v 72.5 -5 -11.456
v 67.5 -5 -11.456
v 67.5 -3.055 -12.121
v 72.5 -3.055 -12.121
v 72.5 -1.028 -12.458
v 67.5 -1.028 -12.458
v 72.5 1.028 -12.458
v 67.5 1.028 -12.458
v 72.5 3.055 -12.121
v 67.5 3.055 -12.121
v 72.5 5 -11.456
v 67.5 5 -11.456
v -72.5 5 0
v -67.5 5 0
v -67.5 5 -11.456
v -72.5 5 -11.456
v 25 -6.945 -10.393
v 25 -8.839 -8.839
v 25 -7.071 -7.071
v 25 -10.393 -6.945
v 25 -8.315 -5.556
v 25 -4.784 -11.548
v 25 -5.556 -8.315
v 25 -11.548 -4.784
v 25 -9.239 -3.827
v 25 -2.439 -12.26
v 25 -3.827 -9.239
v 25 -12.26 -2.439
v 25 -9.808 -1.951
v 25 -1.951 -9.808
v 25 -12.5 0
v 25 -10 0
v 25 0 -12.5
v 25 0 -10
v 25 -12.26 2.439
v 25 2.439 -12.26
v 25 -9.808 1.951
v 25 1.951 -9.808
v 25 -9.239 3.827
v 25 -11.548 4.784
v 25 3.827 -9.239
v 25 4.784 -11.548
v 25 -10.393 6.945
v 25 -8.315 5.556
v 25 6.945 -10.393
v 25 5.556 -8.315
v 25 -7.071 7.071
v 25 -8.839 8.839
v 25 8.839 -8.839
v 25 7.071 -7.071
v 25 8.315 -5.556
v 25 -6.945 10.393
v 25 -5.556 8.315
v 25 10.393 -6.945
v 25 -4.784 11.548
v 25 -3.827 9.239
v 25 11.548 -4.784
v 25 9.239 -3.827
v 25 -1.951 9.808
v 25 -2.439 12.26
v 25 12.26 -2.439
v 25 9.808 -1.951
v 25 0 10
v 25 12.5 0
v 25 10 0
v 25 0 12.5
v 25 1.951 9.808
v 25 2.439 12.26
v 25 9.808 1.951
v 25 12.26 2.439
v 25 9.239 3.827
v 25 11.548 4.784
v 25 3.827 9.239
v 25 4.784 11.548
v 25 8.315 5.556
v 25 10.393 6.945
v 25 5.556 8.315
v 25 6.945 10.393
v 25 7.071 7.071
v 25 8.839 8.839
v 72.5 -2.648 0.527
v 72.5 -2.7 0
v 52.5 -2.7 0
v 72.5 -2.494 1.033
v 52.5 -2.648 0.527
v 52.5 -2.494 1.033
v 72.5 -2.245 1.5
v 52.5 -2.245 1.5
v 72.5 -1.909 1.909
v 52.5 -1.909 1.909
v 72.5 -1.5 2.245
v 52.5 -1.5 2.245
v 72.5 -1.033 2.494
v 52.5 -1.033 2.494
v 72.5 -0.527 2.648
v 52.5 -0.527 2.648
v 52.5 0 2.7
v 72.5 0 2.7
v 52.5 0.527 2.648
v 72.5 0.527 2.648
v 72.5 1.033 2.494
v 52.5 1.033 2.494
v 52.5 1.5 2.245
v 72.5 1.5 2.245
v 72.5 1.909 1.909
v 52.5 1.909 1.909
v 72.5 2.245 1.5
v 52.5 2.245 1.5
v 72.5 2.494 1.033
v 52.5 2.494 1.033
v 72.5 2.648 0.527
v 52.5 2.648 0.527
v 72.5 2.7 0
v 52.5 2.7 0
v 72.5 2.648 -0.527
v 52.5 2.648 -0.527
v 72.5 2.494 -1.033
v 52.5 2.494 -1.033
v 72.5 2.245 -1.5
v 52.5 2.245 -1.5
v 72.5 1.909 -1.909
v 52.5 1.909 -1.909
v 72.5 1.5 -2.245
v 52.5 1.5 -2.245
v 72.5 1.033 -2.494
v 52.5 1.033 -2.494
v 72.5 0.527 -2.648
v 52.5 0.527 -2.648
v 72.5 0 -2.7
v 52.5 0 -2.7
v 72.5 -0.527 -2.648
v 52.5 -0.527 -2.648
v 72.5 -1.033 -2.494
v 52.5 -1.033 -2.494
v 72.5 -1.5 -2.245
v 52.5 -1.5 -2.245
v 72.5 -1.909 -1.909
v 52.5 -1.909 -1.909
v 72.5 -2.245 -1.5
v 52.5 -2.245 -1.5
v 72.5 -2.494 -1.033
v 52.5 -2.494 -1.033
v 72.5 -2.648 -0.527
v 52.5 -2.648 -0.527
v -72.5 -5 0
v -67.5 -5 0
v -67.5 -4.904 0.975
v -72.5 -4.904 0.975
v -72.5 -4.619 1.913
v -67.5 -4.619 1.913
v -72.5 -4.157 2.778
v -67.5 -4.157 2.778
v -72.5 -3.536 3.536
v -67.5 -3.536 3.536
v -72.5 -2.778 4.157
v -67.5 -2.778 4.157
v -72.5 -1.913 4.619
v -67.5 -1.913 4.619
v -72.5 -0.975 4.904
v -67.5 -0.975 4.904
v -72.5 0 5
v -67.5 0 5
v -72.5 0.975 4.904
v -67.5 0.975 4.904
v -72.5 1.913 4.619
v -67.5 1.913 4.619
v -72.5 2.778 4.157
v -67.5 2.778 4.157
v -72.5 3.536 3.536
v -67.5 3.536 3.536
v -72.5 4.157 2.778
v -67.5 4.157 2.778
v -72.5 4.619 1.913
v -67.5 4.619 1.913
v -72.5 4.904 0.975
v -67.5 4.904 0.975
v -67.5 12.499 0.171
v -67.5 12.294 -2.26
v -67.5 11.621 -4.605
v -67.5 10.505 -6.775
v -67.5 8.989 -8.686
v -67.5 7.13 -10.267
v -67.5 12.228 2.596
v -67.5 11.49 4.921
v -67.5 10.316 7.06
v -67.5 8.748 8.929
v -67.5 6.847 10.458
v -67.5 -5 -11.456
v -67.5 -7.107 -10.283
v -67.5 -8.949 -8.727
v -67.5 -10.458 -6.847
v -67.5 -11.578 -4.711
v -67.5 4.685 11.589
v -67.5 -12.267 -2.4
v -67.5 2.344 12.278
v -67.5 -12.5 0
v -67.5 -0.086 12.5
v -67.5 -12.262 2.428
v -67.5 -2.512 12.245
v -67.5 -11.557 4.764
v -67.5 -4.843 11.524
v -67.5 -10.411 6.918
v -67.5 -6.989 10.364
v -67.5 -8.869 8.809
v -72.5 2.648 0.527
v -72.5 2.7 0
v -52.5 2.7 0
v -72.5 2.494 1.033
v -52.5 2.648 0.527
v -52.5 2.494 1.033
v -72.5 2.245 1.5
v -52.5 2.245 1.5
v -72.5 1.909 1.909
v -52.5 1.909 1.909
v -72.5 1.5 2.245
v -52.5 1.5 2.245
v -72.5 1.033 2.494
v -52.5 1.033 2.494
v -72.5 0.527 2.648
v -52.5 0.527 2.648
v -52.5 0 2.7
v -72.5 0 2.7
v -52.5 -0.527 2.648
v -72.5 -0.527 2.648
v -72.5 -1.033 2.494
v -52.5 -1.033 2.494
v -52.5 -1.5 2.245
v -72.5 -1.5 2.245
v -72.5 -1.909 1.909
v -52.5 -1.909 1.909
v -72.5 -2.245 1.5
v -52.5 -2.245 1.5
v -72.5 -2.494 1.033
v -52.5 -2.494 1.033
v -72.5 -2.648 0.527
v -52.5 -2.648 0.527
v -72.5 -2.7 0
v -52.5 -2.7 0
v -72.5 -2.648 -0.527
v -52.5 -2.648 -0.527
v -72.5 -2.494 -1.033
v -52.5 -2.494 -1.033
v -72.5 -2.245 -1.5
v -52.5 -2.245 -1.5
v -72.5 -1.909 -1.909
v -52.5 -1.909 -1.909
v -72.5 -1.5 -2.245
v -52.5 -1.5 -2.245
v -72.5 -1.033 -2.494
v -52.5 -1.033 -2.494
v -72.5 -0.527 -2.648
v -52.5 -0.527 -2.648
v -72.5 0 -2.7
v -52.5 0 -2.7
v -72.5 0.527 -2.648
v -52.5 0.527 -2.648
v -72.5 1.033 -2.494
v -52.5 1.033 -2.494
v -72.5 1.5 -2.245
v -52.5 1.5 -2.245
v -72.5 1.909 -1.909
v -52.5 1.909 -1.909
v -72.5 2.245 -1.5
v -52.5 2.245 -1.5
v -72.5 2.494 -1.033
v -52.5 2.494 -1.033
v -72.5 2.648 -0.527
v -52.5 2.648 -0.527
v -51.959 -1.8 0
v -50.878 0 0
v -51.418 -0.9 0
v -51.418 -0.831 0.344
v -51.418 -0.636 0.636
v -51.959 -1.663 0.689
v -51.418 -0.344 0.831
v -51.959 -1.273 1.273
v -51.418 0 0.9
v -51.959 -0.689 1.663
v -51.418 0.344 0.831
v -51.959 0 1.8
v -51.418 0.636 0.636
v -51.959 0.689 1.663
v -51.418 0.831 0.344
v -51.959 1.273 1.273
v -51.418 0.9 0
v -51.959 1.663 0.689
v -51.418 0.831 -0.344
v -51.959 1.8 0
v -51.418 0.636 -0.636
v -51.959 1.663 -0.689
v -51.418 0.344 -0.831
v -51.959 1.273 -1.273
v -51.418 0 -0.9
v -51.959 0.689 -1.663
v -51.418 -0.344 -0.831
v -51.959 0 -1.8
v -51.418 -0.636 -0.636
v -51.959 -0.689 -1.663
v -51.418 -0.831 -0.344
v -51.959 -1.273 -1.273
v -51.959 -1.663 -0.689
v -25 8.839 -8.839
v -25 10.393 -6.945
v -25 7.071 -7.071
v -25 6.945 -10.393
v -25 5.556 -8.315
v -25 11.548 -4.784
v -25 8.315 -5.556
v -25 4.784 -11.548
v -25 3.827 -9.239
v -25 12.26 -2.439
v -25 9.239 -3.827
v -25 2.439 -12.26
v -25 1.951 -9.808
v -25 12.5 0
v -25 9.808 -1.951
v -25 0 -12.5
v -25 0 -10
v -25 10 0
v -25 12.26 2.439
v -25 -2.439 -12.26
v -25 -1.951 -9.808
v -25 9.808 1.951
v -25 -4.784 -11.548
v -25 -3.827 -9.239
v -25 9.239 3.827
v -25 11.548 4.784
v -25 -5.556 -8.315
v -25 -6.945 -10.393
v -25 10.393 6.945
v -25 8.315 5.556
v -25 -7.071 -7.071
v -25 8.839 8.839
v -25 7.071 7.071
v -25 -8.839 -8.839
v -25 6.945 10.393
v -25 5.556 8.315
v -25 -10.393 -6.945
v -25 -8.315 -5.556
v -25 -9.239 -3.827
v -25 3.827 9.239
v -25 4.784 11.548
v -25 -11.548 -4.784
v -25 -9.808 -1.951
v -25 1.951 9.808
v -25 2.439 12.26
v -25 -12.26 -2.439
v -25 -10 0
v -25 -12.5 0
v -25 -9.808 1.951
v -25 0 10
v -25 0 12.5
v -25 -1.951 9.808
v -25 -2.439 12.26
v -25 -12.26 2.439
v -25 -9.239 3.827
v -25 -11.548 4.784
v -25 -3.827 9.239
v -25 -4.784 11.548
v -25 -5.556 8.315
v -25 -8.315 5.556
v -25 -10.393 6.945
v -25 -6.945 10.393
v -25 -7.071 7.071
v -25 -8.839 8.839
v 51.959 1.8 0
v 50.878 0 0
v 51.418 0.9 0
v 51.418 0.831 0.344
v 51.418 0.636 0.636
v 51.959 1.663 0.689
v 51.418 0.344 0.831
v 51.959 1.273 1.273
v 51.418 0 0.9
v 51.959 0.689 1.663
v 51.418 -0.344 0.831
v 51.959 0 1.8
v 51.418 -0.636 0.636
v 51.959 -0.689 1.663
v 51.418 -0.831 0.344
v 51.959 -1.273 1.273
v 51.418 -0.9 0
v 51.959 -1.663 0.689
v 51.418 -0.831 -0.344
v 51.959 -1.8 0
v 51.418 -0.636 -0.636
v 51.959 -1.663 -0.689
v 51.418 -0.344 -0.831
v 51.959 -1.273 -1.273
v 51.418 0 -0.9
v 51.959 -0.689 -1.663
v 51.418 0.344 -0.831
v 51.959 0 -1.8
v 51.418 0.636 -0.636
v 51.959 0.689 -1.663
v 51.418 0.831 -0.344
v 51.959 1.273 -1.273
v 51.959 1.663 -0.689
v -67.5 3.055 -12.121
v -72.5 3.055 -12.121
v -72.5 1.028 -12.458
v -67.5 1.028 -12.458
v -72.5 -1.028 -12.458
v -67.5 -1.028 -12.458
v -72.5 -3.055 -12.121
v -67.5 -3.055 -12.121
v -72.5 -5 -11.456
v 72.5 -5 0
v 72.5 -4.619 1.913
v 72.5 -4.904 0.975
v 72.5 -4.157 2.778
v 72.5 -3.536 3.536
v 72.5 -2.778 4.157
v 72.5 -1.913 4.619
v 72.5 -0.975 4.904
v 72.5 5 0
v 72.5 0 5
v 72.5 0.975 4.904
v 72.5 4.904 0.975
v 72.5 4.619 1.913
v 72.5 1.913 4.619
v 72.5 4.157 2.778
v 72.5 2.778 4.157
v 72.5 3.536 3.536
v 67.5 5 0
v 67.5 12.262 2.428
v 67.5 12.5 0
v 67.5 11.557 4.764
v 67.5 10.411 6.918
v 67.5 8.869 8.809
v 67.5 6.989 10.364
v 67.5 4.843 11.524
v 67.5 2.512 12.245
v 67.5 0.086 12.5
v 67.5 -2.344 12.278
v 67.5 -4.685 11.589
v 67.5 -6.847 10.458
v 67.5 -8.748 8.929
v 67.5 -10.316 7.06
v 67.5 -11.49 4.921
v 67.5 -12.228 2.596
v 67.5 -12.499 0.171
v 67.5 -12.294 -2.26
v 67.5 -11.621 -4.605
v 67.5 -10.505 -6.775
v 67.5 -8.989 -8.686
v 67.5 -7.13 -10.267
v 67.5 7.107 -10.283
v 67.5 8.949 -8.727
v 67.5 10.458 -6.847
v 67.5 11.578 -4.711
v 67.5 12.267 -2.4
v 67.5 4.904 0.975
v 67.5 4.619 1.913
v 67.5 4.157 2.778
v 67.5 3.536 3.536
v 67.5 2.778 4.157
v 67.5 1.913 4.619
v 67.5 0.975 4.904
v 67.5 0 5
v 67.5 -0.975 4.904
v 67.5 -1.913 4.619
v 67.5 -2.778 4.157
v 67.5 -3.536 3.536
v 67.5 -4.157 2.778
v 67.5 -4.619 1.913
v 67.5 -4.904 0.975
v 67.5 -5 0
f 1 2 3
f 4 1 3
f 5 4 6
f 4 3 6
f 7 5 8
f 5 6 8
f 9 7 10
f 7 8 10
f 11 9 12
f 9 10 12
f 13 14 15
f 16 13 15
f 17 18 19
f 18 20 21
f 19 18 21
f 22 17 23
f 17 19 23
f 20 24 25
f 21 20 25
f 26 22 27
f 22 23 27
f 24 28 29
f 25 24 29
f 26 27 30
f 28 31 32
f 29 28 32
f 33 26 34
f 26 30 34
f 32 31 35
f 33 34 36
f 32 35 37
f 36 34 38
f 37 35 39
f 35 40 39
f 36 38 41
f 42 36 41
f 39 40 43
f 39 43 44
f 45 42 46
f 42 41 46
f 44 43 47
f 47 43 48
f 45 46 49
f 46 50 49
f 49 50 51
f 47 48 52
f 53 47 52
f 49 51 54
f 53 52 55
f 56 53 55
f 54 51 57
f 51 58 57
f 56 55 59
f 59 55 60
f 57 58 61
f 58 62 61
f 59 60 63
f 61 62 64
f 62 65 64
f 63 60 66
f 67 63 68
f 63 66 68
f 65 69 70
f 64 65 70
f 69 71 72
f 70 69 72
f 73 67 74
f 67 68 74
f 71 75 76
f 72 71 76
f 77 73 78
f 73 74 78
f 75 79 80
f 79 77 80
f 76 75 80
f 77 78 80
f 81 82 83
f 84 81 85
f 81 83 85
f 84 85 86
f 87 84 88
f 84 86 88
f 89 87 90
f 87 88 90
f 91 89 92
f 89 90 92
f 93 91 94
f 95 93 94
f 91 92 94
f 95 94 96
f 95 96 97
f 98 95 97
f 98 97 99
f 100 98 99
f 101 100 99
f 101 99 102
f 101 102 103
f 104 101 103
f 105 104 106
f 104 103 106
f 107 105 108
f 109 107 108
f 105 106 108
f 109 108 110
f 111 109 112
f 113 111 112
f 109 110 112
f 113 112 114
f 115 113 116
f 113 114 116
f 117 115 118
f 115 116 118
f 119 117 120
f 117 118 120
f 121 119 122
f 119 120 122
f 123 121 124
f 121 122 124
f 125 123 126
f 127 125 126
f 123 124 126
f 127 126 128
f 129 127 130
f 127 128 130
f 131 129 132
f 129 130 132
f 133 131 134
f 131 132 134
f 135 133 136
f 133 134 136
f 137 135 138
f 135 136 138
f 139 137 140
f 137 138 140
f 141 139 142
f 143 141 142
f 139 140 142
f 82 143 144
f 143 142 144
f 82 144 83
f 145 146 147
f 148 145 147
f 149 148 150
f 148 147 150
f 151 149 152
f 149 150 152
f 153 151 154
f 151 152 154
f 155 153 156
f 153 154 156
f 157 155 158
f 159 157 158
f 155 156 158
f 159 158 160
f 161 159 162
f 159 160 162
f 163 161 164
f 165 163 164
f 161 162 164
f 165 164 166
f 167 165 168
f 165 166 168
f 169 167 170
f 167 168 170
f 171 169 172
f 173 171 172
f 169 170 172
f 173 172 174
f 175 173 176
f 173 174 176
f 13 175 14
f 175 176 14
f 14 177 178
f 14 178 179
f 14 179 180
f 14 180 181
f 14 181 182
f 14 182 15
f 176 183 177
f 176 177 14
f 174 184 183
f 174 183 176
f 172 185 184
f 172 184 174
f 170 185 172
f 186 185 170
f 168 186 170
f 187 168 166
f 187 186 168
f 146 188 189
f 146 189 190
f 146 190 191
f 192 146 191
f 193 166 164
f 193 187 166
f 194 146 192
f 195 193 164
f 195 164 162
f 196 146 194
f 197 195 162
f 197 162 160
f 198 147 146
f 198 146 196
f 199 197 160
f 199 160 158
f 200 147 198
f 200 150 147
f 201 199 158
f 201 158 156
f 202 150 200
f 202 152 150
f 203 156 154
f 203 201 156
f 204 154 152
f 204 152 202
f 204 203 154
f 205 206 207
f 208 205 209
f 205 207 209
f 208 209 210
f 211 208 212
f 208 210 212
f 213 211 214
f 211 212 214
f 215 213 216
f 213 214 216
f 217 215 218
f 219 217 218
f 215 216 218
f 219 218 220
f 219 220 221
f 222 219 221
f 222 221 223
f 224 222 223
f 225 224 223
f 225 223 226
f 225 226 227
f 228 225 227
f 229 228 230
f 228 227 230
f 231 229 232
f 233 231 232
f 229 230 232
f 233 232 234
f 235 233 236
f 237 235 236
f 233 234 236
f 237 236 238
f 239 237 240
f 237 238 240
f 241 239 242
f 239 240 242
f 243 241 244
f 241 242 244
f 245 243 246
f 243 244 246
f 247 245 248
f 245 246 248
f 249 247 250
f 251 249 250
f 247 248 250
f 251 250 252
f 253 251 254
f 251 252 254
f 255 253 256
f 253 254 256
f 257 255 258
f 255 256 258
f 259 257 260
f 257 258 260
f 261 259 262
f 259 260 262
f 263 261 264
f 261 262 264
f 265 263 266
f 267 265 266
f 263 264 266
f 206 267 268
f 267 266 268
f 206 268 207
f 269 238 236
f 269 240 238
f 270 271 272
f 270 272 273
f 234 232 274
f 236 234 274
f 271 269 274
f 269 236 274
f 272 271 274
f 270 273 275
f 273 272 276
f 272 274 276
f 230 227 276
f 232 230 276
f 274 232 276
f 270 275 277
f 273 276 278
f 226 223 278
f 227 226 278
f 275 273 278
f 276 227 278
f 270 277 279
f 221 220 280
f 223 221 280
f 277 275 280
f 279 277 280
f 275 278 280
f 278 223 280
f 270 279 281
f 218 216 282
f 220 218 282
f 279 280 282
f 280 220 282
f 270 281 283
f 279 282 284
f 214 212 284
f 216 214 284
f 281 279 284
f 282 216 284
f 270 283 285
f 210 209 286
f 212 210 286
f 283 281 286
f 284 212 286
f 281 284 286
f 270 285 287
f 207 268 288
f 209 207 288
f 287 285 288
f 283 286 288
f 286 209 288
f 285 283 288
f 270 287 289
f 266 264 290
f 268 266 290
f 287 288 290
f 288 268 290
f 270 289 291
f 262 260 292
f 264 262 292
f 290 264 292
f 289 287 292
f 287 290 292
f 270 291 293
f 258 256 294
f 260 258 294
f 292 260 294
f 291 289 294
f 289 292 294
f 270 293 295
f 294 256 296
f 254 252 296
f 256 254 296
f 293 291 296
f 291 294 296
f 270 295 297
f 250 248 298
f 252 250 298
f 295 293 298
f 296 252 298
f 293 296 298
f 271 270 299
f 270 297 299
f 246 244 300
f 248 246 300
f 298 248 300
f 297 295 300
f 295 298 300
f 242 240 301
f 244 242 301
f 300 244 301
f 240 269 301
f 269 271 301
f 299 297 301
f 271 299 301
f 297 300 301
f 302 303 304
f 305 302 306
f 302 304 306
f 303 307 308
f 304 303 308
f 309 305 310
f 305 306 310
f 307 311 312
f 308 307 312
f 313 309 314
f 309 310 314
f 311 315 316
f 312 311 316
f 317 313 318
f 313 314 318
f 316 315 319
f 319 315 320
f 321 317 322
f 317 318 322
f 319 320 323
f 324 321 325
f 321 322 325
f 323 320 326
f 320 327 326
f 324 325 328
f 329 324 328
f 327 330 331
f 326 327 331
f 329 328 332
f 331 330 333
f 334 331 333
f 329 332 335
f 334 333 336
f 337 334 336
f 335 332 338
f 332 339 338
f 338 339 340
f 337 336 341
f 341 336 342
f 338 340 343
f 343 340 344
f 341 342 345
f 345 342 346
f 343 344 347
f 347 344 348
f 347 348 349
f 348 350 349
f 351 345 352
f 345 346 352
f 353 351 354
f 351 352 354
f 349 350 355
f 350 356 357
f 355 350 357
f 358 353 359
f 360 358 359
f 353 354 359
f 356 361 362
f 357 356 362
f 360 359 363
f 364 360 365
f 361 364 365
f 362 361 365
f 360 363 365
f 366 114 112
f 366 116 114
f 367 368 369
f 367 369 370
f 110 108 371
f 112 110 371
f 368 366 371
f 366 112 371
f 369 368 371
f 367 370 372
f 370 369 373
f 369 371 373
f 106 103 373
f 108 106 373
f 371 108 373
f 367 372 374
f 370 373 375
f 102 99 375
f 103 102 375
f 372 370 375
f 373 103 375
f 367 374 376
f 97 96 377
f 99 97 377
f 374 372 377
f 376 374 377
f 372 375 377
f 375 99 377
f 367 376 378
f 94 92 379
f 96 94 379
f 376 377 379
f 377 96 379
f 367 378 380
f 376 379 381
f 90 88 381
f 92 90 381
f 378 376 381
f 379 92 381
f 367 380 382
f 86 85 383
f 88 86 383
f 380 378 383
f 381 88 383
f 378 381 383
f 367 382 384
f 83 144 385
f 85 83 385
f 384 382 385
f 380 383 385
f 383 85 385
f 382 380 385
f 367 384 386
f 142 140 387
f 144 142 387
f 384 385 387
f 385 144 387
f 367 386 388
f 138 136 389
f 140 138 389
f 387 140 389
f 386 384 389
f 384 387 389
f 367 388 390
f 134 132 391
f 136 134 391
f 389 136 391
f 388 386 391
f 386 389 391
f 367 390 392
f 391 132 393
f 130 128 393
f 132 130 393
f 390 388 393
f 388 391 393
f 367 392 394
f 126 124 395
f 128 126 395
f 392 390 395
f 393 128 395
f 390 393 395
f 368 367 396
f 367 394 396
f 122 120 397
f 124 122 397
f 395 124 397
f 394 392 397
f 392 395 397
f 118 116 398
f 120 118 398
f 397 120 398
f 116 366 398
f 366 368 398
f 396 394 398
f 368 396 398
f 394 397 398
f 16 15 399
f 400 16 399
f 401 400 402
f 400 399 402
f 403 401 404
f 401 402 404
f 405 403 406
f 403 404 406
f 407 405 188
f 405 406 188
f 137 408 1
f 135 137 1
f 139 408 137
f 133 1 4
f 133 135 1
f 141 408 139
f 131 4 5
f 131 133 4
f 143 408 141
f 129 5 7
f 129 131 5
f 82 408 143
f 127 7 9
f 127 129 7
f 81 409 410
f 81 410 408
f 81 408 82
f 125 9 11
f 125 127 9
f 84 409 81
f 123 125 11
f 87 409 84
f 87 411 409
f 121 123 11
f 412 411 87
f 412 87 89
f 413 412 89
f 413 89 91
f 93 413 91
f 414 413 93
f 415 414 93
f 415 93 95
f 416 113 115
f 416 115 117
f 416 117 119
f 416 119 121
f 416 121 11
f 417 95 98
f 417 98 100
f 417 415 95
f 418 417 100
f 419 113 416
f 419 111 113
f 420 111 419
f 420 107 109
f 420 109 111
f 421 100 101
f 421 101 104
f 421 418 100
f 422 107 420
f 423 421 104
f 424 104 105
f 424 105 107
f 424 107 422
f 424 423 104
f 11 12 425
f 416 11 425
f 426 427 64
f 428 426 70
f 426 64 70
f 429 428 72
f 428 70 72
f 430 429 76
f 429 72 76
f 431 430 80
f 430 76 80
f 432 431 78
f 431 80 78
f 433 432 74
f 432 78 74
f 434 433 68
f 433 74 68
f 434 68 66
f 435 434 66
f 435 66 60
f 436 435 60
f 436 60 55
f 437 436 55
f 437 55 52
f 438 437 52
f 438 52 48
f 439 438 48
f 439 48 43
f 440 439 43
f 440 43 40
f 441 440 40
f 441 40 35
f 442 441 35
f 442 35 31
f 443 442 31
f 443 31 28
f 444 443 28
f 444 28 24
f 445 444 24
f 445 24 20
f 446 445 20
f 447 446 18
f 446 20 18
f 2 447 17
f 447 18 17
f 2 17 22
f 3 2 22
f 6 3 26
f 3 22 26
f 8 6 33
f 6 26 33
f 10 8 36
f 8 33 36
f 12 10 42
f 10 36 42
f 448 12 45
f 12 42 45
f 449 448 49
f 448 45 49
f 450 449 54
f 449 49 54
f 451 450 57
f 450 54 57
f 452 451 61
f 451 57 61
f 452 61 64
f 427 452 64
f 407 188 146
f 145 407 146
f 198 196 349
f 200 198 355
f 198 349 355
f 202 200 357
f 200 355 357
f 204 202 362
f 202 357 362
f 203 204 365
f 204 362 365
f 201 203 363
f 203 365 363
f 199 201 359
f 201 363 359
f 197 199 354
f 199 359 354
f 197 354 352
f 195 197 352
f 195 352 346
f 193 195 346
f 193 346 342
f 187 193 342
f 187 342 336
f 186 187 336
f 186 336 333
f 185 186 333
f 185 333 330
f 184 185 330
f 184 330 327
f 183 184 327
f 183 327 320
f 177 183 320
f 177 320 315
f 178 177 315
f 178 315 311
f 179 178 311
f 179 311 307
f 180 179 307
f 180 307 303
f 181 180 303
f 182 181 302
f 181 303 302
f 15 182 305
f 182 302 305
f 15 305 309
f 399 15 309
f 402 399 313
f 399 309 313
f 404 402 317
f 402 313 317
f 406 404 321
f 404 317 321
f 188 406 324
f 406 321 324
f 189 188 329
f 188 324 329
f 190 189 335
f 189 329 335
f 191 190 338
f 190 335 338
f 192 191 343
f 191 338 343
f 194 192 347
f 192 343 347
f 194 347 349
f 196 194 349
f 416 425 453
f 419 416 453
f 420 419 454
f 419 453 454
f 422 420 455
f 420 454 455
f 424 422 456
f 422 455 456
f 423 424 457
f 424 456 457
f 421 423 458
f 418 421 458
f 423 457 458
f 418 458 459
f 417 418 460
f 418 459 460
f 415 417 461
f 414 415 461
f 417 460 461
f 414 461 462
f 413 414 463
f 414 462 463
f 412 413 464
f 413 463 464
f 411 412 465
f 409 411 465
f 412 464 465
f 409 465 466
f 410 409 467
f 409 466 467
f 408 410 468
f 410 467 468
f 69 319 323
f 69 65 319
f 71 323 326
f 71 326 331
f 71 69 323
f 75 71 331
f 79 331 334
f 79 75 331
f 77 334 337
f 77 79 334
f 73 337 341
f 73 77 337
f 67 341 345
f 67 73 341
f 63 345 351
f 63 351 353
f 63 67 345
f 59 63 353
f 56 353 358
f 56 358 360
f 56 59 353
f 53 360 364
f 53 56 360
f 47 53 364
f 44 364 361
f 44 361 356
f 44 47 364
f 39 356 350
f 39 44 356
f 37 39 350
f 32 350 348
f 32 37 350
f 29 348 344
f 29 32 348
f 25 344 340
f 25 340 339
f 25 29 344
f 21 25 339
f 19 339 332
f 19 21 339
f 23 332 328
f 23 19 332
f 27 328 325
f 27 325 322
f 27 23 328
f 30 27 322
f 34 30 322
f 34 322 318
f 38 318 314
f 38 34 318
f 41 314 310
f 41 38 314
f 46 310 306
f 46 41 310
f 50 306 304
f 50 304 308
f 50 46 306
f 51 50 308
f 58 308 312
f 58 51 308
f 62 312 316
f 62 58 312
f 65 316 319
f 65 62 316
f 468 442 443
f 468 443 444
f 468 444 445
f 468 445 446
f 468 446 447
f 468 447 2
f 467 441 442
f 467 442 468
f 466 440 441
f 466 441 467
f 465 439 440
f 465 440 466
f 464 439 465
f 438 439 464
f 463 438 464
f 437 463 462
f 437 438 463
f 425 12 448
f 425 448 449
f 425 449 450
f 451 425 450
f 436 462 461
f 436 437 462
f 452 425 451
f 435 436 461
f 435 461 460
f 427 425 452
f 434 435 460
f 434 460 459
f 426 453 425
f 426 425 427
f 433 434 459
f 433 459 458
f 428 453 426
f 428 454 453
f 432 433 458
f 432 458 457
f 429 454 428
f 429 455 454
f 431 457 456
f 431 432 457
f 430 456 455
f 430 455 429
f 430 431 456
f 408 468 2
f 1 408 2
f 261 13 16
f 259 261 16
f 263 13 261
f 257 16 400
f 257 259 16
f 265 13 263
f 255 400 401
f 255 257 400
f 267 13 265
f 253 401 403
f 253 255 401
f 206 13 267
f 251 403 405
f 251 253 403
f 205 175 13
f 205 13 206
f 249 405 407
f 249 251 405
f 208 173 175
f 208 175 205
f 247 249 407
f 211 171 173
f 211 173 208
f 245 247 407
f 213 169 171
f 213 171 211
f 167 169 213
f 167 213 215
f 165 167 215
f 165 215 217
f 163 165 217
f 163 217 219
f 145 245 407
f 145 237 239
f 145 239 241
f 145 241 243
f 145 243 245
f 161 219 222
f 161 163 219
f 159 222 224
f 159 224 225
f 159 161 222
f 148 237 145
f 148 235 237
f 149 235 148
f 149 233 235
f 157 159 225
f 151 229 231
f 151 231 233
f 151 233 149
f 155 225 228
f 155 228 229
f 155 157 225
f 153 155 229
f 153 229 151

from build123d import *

# Parameters (mm, degrees)
F0_R      = 10
F1_DEPTH  = 25
F2_R      = 12.5
F3_DEPTH  = 42.5
F4_R      = 12.5
F5_DEPTH  = 42.5
F7_DEPTH  = 5
F9_D      = 5.4
F9_DEPTH  = 20
F9_TIP    = 1.6223236714
F11_DEPTH = 5
F13_D     = 5.4
F13_DEPTH = 20
F13_TIP   = 1.6223236714


with BuildPart() as f1:
    # F0 (on Right) → F1 (new body, symmetric)
    with BuildSketch(Plane.YZ):
        Circle(F0_R)
    extrude(amount=F1_DEPTH, both=True)

    # F2 (on face) → F3 (join)
    with BuildSketch(Plane.YZ.offset(25)):
        Circle(F2_R)
    extrude(amount=F3_DEPTH)

    # F4 (on face) → F5 (join)
    with BuildSketch(Plane(origin=(-25, 0, 0), x_dir=(0, -1, 0), z_dir=(-1, 0, 0))):
        Circle(F4_R)
    extrude(amount=F5_DEPTH)

    # F6 (on face) → F7 (join)
    with BuildSketch(Plane.YZ.offset(67.5)):
        with BuildLine():
            Line((5, -11.4564392374), (5, 0))
            ThreePointArc((5, 0), (0, -5), (-5, 0))
            Line((-5, 0), (-5, -11.4564392374))
            ThreePointArc((-5, -11.4564392374), (0, -12.5), (5, -11.4564392374))
        make_face()
        with BuildLine():
            ThreePointArc((-5, 0), (0, -5), (5, 0))
            ThreePointArc((5, 0), (0, 5), (-5, 0))
        make_face()
    extrude(amount=F7_DEPTH)

    # F9
    with Locations(Plane.YZ.offset(72.5)):
        with Locations((0, 0)):
            Hole(F9_D / 2, depth=F9_DEPTH)
            with Locations((0, 0, -(F9_DEPTH + F9_TIP / 2))):  # 118° drill point
                Cone(0, F9_D / 2, F9_TIP, mode=Mode.SUBTRACT)

    # F10 (on face) → F11 (join)
    with BuildSketch(Plane(origin=(-67.5, 0, 0), x_dir=(0, -1, 0), z_dir=(-1, 0, 0))):
        with BuildLine():
            ThreePointArc((-5, 0), (0, -5), (5, 0))
            ThreePointArc((5, 0), (0, 5), (-5, 0))
        make_face()
        with BuildLine():
            Line((5, -11.4564392374), (5, 0))
            ThreePointArc((5, 0), (0, -5), (-5, 0))
            Line((-5, 0), (-5, -11.4564392374))
            ThreePointArc((-5, -11.4564392374), (0, -12.5), (5, -11.4564392374))
        make_face()
    extrude(amount=F11_DEPTH)

    # F13
    with Locations(Plane(origin=(-72.5, 0, 0), x_dir=(0, -1, 0), z_dir=(-1, 0, 0))):
        with Locations((0, 0)):
            Hole(F13_D / 2, depth=F13_DEPTH)
            with Locations((0, 0, -(F13_DEPTH + F13_TIP / 2))):  # 118° drill point
                Cone(0, F13_D / 2, F13_TIP, mode=Mode.SUBTRACT)


solid = f1.part
